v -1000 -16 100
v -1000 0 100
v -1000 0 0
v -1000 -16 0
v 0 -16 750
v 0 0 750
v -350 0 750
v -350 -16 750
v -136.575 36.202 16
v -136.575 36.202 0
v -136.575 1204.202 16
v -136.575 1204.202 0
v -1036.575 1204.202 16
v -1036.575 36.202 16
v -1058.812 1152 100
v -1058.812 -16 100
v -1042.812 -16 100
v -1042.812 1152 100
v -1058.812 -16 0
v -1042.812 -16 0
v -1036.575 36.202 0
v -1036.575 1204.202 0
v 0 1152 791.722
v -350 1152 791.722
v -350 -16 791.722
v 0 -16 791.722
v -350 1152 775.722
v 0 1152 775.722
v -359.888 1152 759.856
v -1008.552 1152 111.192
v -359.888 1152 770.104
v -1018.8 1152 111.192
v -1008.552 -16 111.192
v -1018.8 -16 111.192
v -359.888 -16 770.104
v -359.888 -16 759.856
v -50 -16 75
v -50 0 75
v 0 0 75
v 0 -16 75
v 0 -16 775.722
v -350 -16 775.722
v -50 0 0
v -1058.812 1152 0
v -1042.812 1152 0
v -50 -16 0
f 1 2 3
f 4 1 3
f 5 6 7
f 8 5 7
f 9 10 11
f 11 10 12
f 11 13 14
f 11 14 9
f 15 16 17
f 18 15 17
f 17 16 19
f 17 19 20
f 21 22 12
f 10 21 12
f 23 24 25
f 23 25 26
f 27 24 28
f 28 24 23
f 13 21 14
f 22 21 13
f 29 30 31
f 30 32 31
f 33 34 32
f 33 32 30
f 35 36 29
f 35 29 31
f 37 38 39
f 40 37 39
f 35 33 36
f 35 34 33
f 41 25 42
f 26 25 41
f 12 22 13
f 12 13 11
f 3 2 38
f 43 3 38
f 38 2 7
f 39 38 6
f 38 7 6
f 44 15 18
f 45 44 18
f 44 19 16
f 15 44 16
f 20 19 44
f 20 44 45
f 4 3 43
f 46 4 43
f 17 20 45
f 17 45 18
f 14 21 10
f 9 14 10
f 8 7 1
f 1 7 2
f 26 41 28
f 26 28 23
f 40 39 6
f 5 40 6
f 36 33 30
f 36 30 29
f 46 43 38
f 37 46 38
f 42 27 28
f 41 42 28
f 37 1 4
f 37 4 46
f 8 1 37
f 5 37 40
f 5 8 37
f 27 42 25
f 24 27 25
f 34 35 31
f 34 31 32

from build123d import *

# Parameters (mm, degrees)
F1_DEPTH = 16
F2_W     = 900
F2_H     = 1168
F3_DEPTH = 16
F4_W     = 350
F4_H     = 16
F5_DEPTH = 1168
F6_W     = 16
F6_H     = 100
F7_DEPTH = 1168
F9_DEPTH = 1168


with BuildPart() as f1:
    # F0 (on Front) → F1 (new body)
    with BuildSketch(Plane.XZ):
        Polygon((-1000, 100), (-1000, 0), (-50, 0), (-50, 75), (0, 75), (0, 750), (-350, 750), align=None)
    extrude(amount=F1_DEPTH)


with BuildPart() as f3:
    # F2 (on Top) → F3 (new body)
    with BuildSketch(Plane.XY):
        with Locations((-586.5750610828, 620.2018796388)):
            Rectangle(F2_W, F2_H)
    extrude(amount=F3_DEPTH)


with BuildPart() as f5:
    # F4 (on face) → F5 (new body)
    with BuildSketch(Plane.XZ.offset(16)):
        with Locations((-175, 783.7218369622)):
            Rectangle(F4_W, F4_H)
    extrude(amount=-F5_DEPTH)


with BuildPart() as f7:
    # F6 (on face) → F7 (new body)
    with BuildSketch(Plane.XZ.offset(16)):
        with Locations((-1050.8124990463, 50)):
            Rectangle(F6_W, F6_H)
    extrude(amount=-F7_DEPTH)


with BuildPart() as f9:
    # F8 (on face) → F9 (new body)
    with BuildSketch(Plane.XZ.offset(16)):
        Polygon((-1008.5517726839, 111.1917831004), (-359.8879277706, 759.8556280136), (-359.8879277706, 770.1042331755), (-1018.8003778458, 111.1917831004), align=None)
    extrude(amount=-F9_DEPTH)


solid = Compound([f1.part, f3.part, f5.part, f7.part, f9.part])
